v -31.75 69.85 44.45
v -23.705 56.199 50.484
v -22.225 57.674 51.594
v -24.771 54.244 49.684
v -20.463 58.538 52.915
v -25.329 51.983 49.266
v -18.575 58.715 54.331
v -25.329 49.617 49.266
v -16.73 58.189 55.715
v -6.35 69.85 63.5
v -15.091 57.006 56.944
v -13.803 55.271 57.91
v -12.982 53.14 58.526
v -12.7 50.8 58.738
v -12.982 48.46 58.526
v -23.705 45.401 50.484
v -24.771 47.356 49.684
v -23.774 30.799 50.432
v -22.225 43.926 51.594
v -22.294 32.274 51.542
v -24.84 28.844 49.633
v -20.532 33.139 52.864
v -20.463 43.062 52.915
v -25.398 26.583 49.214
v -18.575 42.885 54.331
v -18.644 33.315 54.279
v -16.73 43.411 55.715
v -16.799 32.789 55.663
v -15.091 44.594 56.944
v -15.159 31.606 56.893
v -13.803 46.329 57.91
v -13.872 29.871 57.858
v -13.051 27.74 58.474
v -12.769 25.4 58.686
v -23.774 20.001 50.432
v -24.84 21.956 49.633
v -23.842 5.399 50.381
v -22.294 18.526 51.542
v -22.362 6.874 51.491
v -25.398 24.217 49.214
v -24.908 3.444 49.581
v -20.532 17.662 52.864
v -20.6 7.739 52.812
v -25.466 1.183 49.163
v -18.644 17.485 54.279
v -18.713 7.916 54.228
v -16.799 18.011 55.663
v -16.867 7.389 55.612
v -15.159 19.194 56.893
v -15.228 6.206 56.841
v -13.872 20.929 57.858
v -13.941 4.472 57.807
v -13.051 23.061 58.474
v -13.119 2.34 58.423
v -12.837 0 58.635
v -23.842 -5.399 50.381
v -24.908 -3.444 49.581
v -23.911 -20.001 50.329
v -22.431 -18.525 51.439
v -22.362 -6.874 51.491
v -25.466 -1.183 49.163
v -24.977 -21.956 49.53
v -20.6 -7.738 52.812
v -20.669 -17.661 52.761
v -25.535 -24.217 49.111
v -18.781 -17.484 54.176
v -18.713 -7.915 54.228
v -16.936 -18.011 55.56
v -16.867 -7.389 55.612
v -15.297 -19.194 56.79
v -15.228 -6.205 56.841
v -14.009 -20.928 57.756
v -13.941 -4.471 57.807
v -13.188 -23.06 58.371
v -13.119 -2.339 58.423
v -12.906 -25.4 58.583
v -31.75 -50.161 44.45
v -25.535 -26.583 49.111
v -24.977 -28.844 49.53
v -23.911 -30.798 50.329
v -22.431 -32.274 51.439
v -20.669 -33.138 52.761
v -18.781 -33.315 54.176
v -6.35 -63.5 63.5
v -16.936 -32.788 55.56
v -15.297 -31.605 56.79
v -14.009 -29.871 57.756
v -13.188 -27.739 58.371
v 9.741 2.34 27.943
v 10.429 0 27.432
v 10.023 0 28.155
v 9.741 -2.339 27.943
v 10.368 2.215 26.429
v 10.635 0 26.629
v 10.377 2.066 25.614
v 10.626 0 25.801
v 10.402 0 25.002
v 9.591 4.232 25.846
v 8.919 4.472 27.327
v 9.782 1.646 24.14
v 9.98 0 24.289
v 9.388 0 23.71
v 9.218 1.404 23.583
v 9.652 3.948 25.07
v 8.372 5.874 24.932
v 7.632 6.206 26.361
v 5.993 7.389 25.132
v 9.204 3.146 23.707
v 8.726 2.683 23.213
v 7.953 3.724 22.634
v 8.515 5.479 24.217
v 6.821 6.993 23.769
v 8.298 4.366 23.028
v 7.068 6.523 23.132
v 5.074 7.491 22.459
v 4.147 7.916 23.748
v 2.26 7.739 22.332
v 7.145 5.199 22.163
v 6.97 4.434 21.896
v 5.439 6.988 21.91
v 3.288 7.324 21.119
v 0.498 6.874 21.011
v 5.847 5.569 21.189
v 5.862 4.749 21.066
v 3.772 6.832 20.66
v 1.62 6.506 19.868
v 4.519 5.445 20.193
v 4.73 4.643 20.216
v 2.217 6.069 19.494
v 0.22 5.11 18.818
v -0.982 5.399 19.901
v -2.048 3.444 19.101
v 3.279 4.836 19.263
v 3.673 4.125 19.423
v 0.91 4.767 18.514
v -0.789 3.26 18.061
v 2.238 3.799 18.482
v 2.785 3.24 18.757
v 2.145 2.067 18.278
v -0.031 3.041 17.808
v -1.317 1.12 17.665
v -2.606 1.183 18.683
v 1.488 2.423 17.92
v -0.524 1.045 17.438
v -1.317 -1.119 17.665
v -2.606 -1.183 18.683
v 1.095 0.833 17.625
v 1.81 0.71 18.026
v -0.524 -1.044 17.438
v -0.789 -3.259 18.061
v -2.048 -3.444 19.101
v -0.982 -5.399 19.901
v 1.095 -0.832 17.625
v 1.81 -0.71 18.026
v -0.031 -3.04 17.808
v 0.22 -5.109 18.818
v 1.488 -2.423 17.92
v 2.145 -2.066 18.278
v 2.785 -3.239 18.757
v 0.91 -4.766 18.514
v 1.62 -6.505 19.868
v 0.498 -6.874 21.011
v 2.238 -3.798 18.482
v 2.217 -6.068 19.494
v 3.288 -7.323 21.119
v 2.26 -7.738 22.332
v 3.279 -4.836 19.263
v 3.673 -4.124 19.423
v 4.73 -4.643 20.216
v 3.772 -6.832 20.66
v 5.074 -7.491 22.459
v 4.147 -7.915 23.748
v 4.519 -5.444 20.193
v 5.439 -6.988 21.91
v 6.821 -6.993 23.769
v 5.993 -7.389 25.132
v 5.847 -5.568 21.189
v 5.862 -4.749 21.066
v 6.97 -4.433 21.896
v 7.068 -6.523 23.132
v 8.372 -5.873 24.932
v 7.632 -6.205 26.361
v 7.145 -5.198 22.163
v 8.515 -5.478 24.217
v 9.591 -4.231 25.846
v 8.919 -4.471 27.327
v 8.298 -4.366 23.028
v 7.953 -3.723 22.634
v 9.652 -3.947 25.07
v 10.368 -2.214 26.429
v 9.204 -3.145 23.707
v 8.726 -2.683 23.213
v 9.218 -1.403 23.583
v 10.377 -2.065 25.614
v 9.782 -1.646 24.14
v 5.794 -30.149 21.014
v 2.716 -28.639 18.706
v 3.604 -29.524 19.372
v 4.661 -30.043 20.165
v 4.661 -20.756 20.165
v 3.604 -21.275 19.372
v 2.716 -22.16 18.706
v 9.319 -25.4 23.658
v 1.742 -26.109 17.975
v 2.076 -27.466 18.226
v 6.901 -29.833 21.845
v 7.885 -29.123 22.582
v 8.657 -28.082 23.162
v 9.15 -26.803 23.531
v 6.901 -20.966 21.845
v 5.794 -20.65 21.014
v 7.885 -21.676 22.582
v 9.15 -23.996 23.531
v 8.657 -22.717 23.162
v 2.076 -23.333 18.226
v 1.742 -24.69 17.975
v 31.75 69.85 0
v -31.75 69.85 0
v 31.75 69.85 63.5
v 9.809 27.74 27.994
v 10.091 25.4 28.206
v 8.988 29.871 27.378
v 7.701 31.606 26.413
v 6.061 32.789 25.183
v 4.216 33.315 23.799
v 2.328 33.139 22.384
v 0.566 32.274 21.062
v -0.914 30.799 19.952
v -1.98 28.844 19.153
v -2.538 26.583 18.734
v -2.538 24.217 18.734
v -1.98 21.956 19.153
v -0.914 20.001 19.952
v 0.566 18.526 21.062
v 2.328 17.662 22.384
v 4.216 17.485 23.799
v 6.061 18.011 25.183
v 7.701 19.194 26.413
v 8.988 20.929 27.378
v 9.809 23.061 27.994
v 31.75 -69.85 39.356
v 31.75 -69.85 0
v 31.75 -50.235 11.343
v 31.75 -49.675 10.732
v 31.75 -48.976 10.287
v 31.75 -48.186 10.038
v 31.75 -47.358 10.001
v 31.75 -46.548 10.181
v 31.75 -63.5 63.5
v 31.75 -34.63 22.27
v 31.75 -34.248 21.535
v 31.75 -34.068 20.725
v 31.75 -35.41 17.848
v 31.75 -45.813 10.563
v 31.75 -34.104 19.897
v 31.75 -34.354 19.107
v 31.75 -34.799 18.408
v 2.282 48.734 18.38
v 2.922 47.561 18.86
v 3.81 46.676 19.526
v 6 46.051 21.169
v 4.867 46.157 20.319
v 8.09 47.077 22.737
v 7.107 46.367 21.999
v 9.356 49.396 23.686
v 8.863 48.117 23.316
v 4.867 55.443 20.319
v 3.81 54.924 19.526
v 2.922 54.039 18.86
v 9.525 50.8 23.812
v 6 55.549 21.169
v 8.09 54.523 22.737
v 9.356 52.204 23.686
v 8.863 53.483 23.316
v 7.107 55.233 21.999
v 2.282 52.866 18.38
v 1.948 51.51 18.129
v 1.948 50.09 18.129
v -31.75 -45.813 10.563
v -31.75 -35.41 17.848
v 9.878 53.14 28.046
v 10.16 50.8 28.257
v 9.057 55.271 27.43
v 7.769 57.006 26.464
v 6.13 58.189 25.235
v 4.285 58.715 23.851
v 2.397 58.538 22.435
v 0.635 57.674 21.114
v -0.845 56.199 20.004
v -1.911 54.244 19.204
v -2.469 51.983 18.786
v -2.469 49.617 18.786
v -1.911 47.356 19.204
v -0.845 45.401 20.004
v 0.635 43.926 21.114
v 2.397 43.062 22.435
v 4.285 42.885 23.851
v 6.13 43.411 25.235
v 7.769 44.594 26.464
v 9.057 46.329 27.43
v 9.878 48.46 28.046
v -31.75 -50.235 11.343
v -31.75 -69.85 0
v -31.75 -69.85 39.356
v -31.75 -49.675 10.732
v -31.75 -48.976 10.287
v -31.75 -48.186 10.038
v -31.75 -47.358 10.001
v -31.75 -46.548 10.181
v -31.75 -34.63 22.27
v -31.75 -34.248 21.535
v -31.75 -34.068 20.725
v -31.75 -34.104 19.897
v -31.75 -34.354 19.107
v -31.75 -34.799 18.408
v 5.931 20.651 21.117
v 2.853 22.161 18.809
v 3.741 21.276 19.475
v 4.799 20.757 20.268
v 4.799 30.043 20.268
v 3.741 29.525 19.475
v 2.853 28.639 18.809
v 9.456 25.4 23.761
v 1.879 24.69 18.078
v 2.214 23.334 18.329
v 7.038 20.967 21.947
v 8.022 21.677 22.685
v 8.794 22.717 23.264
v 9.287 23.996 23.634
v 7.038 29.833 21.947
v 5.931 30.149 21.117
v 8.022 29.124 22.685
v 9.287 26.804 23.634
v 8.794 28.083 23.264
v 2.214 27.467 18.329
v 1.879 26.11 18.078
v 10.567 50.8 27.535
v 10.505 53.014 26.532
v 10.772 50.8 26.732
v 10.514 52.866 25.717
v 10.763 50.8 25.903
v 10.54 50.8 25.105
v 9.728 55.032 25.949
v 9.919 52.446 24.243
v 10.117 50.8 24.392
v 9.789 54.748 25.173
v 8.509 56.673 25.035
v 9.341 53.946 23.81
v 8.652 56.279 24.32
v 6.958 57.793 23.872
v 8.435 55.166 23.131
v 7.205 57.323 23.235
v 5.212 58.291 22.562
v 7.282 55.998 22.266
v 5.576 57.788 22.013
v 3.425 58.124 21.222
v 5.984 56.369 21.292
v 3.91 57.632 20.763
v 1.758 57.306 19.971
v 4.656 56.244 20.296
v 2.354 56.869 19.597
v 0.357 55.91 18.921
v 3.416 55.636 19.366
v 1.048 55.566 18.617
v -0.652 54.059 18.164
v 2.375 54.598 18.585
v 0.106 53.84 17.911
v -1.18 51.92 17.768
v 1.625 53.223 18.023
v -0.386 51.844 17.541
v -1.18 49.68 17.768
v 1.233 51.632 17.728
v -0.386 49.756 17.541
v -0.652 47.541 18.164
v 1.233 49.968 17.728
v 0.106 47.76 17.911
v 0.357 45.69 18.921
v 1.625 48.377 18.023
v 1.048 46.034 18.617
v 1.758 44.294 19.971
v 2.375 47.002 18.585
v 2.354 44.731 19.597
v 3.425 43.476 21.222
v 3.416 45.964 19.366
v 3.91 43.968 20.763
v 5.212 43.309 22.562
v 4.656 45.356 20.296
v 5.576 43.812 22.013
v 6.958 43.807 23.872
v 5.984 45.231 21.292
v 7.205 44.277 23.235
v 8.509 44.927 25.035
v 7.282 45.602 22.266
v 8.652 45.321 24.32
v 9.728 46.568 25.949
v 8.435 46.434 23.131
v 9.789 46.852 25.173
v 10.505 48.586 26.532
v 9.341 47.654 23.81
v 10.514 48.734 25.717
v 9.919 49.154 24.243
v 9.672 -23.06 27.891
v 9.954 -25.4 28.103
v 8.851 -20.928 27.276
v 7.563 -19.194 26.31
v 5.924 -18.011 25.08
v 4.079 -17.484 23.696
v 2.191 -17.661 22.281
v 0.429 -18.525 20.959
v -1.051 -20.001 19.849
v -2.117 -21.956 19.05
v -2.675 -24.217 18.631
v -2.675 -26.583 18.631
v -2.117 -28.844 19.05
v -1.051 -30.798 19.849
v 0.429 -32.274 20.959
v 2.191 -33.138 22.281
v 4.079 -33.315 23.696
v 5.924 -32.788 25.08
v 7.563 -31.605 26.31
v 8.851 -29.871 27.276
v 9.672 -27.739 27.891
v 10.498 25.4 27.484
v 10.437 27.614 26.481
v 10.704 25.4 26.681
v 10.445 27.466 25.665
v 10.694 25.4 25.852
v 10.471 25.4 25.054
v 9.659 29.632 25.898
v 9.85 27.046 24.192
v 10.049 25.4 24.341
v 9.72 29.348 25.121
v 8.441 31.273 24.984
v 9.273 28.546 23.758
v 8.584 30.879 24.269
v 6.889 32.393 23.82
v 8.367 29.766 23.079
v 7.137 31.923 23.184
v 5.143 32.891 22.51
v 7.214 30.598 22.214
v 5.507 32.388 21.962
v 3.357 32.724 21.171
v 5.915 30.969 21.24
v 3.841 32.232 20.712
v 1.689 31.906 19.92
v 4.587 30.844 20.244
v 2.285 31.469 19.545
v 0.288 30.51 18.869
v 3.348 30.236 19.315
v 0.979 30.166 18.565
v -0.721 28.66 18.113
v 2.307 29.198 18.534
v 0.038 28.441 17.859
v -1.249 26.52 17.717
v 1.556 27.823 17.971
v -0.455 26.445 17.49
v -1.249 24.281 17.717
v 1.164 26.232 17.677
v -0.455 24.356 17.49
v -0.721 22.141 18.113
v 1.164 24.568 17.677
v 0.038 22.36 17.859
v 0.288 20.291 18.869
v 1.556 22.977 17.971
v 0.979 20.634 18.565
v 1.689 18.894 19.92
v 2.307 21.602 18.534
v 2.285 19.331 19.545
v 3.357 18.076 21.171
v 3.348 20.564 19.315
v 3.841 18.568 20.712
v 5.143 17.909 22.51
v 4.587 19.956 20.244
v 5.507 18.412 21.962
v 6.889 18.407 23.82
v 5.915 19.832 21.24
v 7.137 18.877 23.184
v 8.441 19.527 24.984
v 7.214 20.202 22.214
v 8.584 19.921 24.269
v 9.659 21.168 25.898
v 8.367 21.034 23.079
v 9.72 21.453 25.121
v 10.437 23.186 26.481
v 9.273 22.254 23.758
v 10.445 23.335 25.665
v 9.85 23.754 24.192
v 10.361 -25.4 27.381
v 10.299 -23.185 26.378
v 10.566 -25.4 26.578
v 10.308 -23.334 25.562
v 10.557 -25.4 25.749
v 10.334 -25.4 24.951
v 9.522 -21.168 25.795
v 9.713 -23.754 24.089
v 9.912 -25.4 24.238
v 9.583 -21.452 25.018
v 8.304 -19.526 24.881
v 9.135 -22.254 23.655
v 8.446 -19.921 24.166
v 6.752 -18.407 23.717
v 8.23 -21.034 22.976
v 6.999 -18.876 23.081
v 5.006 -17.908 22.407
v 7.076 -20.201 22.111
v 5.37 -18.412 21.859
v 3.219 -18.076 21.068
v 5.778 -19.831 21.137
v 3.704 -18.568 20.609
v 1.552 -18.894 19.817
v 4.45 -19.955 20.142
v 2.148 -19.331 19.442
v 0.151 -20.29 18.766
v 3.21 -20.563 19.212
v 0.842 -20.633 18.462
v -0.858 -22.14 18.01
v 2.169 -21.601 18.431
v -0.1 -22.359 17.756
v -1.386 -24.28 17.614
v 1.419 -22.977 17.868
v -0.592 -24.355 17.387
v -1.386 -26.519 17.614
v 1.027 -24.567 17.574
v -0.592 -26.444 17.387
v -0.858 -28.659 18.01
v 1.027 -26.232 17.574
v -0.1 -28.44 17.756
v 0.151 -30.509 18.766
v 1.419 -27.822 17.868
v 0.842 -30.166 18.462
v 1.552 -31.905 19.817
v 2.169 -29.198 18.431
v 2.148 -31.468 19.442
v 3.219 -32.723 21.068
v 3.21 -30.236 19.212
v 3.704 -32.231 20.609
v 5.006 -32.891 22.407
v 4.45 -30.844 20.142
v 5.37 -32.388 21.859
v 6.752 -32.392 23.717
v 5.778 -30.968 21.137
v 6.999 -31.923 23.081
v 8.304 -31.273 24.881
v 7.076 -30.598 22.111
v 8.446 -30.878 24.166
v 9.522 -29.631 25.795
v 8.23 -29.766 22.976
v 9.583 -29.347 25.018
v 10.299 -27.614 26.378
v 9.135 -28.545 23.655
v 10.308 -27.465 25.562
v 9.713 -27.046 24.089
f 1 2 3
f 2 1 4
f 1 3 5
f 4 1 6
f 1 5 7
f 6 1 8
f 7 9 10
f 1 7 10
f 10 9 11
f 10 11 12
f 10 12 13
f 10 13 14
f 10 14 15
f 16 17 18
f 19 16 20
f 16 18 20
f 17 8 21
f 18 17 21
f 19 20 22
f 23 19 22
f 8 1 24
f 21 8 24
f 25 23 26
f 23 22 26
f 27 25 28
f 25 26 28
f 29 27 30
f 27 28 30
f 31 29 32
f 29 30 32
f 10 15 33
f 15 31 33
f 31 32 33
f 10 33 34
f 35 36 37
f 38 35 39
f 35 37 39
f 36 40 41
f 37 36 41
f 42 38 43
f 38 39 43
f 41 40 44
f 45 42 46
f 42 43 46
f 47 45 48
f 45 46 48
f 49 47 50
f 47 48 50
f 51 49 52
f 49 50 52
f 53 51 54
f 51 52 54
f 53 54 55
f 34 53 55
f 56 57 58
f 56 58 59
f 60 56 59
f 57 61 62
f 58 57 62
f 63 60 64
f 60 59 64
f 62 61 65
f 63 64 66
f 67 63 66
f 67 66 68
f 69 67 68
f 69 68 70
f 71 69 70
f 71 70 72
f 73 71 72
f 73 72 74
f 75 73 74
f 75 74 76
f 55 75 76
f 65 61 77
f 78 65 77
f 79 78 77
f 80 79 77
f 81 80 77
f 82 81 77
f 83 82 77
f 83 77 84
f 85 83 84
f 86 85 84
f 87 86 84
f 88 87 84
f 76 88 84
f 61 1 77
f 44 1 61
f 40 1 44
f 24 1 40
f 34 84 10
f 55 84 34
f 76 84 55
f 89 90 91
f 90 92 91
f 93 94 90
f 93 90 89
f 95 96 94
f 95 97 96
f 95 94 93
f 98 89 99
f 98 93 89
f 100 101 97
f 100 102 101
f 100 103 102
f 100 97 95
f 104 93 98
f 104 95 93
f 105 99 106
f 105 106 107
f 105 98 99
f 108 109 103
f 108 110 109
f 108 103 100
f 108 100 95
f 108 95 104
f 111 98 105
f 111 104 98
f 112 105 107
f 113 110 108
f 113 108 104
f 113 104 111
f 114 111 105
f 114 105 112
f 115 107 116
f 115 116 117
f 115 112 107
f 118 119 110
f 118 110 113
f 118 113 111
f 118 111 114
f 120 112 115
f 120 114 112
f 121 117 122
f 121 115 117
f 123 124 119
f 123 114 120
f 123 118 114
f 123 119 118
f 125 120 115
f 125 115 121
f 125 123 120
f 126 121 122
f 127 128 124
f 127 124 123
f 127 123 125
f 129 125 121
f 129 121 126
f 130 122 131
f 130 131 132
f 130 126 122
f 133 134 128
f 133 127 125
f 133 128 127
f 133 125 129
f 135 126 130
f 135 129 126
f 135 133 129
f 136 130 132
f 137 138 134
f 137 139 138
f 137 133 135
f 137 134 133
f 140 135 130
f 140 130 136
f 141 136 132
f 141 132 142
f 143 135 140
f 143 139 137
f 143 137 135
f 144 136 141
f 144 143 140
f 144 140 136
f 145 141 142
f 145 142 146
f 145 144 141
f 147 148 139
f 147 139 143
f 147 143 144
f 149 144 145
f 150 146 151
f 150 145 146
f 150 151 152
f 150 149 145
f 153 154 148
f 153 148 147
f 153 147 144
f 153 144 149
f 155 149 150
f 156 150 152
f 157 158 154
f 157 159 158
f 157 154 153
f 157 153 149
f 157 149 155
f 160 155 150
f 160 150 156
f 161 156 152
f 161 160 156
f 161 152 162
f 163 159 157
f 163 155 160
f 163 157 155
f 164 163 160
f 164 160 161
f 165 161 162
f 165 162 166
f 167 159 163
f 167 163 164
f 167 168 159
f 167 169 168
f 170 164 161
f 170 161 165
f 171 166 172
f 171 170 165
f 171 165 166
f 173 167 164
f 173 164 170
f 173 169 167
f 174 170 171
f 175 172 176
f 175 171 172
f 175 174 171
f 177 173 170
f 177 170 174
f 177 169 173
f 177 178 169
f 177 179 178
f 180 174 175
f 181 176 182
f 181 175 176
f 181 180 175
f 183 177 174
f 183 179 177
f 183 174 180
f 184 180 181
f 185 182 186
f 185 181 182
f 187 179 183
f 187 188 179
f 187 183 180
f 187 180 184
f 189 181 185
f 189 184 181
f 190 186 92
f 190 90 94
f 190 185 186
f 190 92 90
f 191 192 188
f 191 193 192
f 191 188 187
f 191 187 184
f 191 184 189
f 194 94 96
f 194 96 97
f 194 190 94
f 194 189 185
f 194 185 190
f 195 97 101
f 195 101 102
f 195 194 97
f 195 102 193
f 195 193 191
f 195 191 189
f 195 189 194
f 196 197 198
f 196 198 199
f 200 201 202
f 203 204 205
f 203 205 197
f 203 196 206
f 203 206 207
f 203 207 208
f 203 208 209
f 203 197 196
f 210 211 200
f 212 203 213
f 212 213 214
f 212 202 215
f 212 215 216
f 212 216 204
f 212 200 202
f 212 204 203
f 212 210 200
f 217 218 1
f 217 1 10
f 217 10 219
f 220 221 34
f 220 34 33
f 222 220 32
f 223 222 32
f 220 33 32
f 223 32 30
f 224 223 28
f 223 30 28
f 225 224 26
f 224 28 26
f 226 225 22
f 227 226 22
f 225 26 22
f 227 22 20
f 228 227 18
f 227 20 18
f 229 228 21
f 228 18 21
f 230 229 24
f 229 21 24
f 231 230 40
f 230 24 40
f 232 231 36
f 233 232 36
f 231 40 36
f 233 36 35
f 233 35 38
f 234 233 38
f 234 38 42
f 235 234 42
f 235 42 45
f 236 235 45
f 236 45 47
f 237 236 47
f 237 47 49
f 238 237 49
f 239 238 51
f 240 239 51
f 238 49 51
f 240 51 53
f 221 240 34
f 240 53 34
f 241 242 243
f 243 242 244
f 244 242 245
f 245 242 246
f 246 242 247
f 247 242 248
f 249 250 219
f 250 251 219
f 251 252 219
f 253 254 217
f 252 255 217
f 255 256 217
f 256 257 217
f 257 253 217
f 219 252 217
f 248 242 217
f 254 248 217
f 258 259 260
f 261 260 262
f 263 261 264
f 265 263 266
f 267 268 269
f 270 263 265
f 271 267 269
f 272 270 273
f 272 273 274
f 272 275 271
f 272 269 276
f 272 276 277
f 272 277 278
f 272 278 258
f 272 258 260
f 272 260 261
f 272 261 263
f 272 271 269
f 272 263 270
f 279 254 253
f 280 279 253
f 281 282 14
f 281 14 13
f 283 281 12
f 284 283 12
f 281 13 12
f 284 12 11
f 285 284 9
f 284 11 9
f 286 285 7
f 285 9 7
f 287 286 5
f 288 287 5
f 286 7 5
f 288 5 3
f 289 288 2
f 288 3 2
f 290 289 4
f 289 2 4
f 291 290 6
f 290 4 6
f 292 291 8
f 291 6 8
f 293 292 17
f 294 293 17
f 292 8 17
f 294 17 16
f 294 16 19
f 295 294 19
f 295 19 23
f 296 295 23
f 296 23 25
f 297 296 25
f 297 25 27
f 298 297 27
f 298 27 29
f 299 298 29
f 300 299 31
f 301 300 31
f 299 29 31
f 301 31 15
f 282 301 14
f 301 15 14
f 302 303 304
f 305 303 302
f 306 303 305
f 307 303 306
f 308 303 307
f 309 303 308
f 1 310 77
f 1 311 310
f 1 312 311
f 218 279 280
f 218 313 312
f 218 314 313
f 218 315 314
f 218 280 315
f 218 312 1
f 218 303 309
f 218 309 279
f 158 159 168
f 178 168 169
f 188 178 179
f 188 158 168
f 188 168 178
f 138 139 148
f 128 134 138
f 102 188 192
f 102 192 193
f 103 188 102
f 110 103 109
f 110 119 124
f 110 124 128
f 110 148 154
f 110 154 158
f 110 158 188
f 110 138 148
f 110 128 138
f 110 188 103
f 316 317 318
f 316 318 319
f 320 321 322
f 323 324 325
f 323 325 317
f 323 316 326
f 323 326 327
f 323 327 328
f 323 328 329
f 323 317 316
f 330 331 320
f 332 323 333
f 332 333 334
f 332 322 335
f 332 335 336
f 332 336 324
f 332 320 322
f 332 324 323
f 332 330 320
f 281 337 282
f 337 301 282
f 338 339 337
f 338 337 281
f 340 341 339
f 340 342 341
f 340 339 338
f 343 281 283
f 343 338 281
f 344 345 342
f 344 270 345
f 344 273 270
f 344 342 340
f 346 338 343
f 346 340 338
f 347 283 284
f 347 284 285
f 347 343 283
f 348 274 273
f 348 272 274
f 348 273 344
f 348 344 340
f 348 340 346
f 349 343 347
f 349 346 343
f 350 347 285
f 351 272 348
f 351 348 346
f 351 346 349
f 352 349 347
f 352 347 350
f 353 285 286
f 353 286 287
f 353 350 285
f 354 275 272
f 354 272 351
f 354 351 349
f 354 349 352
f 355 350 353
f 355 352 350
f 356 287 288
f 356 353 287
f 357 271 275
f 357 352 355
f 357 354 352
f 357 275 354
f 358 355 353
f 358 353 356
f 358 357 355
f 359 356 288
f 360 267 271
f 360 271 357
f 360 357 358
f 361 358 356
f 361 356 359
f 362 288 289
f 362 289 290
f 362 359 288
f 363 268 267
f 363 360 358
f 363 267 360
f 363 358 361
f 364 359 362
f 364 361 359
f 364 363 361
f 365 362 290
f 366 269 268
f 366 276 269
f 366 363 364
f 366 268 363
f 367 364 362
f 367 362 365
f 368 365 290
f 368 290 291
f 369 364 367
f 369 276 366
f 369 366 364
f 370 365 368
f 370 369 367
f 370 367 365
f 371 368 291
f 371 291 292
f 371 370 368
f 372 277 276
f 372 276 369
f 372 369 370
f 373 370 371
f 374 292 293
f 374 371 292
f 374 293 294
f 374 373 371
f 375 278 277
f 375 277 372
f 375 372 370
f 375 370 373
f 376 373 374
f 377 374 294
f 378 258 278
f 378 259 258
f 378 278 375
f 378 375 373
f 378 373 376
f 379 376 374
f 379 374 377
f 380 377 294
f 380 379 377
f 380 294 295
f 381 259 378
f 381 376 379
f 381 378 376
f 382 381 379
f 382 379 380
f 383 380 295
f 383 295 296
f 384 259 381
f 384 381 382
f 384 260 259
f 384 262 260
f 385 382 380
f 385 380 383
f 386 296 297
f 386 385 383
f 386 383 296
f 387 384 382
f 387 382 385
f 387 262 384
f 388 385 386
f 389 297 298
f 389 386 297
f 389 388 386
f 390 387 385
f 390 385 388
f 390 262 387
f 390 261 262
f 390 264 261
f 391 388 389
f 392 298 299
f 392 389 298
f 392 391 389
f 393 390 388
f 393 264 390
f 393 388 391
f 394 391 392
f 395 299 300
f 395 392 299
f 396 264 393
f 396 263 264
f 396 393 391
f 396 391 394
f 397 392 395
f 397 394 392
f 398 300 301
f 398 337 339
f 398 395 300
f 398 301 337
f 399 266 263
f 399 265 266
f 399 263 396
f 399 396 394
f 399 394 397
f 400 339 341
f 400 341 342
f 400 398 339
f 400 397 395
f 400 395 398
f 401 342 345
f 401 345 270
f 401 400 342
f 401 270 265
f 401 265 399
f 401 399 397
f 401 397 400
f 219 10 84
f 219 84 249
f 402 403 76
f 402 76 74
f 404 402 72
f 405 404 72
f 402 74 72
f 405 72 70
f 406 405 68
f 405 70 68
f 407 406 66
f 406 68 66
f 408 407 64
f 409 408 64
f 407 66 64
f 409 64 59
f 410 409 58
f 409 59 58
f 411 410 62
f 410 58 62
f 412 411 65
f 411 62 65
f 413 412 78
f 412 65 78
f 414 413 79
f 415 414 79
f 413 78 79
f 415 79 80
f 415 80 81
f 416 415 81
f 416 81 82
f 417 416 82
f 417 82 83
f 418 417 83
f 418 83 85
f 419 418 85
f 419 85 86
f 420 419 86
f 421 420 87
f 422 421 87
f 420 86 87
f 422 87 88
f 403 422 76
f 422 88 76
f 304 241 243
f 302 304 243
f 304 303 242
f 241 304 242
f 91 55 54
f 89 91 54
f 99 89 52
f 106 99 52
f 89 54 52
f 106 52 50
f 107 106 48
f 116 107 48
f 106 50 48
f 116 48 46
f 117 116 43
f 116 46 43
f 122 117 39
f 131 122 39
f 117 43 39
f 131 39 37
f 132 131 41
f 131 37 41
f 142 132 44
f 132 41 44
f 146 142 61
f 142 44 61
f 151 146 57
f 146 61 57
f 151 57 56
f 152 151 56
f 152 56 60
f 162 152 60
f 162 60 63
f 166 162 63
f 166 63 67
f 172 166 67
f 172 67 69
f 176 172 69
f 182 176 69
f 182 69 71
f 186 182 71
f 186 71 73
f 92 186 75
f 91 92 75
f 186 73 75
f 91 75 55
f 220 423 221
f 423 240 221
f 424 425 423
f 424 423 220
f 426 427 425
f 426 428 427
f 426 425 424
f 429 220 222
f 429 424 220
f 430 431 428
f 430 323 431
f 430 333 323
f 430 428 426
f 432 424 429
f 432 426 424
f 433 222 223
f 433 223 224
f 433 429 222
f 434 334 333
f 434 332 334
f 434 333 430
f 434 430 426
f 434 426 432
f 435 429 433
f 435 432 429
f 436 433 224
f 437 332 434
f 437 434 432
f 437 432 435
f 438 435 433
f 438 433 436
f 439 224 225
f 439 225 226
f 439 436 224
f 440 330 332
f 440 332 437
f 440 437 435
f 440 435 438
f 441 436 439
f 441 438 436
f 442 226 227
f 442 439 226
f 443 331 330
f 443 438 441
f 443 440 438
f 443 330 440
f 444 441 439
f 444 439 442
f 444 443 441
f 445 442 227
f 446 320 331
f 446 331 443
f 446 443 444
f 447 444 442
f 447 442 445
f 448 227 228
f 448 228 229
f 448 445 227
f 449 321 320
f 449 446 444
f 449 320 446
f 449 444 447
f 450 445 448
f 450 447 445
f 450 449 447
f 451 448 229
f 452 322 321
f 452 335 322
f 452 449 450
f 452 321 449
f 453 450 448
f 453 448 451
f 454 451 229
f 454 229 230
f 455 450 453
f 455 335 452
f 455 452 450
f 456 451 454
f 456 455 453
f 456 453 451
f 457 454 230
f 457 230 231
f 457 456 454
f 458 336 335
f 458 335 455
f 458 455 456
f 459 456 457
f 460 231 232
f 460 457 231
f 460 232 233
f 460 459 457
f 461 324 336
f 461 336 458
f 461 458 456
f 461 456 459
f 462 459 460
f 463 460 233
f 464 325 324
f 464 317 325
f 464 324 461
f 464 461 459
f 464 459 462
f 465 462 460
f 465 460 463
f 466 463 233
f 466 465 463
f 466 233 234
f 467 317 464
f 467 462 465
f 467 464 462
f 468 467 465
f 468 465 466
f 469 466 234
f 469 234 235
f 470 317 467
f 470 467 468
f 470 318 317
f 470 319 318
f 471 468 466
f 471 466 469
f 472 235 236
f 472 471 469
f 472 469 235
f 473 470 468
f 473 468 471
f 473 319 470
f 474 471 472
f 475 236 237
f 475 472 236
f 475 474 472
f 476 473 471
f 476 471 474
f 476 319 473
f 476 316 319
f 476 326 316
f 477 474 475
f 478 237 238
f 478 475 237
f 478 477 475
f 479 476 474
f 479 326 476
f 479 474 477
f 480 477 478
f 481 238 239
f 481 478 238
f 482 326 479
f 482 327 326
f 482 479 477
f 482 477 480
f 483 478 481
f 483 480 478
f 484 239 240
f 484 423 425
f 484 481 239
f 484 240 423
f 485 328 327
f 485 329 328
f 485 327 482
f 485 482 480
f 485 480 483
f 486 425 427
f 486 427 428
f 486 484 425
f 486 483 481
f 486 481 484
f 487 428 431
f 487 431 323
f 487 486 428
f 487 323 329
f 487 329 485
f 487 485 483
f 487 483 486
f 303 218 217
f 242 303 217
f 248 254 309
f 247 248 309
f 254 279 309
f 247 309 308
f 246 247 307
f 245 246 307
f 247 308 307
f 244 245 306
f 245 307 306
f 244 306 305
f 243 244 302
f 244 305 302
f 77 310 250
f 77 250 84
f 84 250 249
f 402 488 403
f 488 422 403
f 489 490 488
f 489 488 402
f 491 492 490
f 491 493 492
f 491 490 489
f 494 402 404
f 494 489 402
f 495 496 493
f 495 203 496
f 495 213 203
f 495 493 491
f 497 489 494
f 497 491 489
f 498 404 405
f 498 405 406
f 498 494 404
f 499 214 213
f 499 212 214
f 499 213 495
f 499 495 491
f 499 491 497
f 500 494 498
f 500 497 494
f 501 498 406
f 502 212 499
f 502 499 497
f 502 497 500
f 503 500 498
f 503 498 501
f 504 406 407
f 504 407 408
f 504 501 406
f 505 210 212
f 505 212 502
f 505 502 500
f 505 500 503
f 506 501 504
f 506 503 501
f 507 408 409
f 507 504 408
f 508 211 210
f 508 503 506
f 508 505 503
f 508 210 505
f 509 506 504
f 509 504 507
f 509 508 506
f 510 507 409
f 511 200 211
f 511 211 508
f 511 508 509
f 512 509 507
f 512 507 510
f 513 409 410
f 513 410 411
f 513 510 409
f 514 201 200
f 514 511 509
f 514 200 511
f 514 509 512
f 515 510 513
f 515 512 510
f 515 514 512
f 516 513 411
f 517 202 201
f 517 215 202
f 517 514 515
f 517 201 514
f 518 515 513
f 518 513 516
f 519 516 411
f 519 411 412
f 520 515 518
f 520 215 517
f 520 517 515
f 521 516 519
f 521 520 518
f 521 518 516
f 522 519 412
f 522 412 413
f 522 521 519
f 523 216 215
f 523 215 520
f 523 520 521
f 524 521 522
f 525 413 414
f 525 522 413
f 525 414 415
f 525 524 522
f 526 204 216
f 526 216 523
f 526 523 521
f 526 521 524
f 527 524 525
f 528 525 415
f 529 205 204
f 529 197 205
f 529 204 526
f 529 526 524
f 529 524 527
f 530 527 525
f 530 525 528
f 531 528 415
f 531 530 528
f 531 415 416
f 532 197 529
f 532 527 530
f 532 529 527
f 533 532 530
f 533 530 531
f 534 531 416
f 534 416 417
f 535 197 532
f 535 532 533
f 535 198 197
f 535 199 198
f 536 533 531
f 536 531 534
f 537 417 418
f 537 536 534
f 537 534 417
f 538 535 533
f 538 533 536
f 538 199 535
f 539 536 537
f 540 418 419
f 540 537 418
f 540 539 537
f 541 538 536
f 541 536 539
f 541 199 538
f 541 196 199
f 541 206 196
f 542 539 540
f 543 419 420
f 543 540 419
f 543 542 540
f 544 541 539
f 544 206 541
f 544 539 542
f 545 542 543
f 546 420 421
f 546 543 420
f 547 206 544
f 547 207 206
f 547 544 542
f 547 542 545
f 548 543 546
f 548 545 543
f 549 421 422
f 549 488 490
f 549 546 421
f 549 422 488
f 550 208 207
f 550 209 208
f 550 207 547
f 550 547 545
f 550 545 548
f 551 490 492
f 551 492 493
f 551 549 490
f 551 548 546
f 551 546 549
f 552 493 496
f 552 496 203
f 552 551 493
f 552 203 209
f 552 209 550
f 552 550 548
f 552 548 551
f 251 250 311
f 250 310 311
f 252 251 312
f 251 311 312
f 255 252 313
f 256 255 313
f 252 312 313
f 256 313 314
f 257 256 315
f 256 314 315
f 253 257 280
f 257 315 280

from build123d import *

# Parameters (mm, degrees)
F0_W     = 63.5
F0_H     = 139.7
F1_DEPTH = 63.5
F3_DEPTH = 139.7
F4_R     = 7.9375
F5_DEPTH = 41.275
F6_R     = 3.175
F8_DEPTH = 63.5
F9_R     = 3.175


with BuildPart() as f1:
    # F0 (on Top) → F1 (new body)
    with BuildSketch(Plane.XY):
        Rectangle(F0_W, F0_H)
    extrude(amount=F1_DEPTH)

    # F2 (on face) → F3 (cut, through all)
    with BuildSketch(Plane.XZ.offset(69.85)):
        Polygon((-31.75, 63.5), (-31.75, 44.45), (-6.35, 63.5), align=None)
    extrude(amount=-F3_DEPTH, mode=Mode.SUBTRACT)

    # F4 (on face) → F5 (cut)
    with BuildSketch(Plane(origin=(-32.766, 0, 43.688), x_dir=(0.8, 0, 0.6), z_dir=(-0.6, 0, 0.8))):
        with Locations((17.145, 50.8)):
            Circle(F4_R)
        with Locations((17.05919, 25.400145)):
            Circle(F4_R)
        with Locations((16.973379, 0.00029)):
            Circle(F4_R)
        with Locations((16.887569, -25.399565)):
            Circle(F4_R)
    extrude(amount=-F5_DEPTH, mode=Mode.SUBTRACT)

    # F6
    f6_edges = [f1.edges().sort_by_distance(p)[0] for p in [
        (-0.840945, -25.399565, 16.038041),
        (-0.772297, 0.00029, 16.089528),
        (-0.703648, 25.400145, 16.141014),
        (-0.635, 50.8, 16.1925),
    ]]
    fillet(f6_edges, radius=F6_R)

    # F7 (on face) → F8 (cut, through all)
    with BuildSketch(Plane.YZ.offset(31.75)):
        Polygon((-69.85, 63.5), (-69.85, 39.356078), (-48.414039, 8.742354), (-32.809193, 19.668985), (-63.5, 63.5), align=None)
    extrude(amount=-F8_DEPTH, mode=Mode.SUBTRACT)

    # F9
    f9_edges = [f1.edges().sort_by_distance(p)[0] for p in [
        (0, -32.809193, 19.668985),
        (0, -48.414039, 8.742354),
    ]]
    fillet(f9_edges, radius=F9_R)


solid = f1.part
